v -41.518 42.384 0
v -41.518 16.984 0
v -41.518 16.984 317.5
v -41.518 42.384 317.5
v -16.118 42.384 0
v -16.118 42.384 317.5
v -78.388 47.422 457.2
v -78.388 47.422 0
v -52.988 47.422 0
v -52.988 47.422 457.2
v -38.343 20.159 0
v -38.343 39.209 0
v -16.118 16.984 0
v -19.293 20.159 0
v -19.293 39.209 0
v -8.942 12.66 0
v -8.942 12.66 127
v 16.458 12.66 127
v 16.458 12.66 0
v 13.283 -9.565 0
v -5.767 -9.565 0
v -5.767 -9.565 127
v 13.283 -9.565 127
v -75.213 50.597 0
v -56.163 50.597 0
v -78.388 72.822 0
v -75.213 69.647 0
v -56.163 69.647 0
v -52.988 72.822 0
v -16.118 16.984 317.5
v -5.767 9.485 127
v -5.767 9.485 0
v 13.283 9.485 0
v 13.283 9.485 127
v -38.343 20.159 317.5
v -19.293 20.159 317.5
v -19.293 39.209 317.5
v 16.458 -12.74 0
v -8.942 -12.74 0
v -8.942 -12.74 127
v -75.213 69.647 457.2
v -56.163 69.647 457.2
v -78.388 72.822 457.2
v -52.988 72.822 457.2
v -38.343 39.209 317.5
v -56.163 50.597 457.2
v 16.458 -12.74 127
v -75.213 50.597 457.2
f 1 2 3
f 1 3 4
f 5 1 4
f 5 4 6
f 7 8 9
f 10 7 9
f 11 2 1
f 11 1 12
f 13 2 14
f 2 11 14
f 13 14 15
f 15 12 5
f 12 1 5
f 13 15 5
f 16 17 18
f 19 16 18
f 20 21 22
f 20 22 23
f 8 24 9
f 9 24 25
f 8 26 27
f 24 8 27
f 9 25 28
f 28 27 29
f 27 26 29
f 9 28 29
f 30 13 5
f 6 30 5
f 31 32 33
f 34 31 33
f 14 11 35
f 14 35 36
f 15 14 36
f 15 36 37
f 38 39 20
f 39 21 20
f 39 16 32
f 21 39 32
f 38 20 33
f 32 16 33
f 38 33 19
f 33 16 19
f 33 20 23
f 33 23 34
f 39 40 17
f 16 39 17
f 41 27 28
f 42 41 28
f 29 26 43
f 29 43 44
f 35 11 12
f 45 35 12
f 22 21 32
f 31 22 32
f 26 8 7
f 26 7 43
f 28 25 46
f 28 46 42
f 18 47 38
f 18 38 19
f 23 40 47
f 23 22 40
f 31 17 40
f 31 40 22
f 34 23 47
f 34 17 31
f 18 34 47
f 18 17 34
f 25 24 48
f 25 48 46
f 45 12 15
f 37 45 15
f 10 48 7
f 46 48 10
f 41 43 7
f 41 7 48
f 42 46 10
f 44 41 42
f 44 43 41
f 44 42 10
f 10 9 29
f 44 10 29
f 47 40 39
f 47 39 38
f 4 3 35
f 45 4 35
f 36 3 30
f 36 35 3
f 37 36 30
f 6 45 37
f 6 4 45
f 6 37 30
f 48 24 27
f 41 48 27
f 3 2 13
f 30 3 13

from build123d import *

# Parameters (mm, degrees)
F0_W     = 25.4
F0_H     = 25.4
F0_W_2   = 19.05
F0_H_2   = 19.05
F1_DEPTH = 457.2
F2_DEPTH = 317.5
F3_DEPTH = 127


with BuildPart() as f1:
    # F0 (on Top) → F1 (new body)
    with BuildSketch(Plane.XY):
        with Locations((-65.687634, 60.122371)):
            Rectangle(F0_W, F0_H)
        with Locations((-65.687634, 60.122371)):
            Rectangle(F0_W_2, F0_H_2, mode=Mode.SUBTRACT)
    extrude(amount=F1_DEPTH)


with BuildPart() as f2:
    # F0 (on Top) → F2 (new body)
    with BuildSketch(Plane.XY):
        with Locations((-28.818203, 29.684331)):
            Rectangle(F0_W, F0_H)
        with Locations((-28.818203, 29.684331)):
            Rectangle(F0_W_2, F0_H_2, mode=Mode.SUBTRACT)
    extrude(amount=F2_DEPTH)


with BuildPart() as f3:
    # F0 (on Top) → F3 (new body)
    with BuildSketch(Plane.XY):
        with Locations((3.757574, -0.039552)):
            Rectangle(F0_W, F0_H)
        with Locations((3.757574, -0.039552)):
            Rectangle(F0_W_2, F0_H_2, mode=Mode.SUBTRACT)
    extrude(amount=F3_DEPTH)


solid = Compound([f1.part, f2.part, f3.part])
